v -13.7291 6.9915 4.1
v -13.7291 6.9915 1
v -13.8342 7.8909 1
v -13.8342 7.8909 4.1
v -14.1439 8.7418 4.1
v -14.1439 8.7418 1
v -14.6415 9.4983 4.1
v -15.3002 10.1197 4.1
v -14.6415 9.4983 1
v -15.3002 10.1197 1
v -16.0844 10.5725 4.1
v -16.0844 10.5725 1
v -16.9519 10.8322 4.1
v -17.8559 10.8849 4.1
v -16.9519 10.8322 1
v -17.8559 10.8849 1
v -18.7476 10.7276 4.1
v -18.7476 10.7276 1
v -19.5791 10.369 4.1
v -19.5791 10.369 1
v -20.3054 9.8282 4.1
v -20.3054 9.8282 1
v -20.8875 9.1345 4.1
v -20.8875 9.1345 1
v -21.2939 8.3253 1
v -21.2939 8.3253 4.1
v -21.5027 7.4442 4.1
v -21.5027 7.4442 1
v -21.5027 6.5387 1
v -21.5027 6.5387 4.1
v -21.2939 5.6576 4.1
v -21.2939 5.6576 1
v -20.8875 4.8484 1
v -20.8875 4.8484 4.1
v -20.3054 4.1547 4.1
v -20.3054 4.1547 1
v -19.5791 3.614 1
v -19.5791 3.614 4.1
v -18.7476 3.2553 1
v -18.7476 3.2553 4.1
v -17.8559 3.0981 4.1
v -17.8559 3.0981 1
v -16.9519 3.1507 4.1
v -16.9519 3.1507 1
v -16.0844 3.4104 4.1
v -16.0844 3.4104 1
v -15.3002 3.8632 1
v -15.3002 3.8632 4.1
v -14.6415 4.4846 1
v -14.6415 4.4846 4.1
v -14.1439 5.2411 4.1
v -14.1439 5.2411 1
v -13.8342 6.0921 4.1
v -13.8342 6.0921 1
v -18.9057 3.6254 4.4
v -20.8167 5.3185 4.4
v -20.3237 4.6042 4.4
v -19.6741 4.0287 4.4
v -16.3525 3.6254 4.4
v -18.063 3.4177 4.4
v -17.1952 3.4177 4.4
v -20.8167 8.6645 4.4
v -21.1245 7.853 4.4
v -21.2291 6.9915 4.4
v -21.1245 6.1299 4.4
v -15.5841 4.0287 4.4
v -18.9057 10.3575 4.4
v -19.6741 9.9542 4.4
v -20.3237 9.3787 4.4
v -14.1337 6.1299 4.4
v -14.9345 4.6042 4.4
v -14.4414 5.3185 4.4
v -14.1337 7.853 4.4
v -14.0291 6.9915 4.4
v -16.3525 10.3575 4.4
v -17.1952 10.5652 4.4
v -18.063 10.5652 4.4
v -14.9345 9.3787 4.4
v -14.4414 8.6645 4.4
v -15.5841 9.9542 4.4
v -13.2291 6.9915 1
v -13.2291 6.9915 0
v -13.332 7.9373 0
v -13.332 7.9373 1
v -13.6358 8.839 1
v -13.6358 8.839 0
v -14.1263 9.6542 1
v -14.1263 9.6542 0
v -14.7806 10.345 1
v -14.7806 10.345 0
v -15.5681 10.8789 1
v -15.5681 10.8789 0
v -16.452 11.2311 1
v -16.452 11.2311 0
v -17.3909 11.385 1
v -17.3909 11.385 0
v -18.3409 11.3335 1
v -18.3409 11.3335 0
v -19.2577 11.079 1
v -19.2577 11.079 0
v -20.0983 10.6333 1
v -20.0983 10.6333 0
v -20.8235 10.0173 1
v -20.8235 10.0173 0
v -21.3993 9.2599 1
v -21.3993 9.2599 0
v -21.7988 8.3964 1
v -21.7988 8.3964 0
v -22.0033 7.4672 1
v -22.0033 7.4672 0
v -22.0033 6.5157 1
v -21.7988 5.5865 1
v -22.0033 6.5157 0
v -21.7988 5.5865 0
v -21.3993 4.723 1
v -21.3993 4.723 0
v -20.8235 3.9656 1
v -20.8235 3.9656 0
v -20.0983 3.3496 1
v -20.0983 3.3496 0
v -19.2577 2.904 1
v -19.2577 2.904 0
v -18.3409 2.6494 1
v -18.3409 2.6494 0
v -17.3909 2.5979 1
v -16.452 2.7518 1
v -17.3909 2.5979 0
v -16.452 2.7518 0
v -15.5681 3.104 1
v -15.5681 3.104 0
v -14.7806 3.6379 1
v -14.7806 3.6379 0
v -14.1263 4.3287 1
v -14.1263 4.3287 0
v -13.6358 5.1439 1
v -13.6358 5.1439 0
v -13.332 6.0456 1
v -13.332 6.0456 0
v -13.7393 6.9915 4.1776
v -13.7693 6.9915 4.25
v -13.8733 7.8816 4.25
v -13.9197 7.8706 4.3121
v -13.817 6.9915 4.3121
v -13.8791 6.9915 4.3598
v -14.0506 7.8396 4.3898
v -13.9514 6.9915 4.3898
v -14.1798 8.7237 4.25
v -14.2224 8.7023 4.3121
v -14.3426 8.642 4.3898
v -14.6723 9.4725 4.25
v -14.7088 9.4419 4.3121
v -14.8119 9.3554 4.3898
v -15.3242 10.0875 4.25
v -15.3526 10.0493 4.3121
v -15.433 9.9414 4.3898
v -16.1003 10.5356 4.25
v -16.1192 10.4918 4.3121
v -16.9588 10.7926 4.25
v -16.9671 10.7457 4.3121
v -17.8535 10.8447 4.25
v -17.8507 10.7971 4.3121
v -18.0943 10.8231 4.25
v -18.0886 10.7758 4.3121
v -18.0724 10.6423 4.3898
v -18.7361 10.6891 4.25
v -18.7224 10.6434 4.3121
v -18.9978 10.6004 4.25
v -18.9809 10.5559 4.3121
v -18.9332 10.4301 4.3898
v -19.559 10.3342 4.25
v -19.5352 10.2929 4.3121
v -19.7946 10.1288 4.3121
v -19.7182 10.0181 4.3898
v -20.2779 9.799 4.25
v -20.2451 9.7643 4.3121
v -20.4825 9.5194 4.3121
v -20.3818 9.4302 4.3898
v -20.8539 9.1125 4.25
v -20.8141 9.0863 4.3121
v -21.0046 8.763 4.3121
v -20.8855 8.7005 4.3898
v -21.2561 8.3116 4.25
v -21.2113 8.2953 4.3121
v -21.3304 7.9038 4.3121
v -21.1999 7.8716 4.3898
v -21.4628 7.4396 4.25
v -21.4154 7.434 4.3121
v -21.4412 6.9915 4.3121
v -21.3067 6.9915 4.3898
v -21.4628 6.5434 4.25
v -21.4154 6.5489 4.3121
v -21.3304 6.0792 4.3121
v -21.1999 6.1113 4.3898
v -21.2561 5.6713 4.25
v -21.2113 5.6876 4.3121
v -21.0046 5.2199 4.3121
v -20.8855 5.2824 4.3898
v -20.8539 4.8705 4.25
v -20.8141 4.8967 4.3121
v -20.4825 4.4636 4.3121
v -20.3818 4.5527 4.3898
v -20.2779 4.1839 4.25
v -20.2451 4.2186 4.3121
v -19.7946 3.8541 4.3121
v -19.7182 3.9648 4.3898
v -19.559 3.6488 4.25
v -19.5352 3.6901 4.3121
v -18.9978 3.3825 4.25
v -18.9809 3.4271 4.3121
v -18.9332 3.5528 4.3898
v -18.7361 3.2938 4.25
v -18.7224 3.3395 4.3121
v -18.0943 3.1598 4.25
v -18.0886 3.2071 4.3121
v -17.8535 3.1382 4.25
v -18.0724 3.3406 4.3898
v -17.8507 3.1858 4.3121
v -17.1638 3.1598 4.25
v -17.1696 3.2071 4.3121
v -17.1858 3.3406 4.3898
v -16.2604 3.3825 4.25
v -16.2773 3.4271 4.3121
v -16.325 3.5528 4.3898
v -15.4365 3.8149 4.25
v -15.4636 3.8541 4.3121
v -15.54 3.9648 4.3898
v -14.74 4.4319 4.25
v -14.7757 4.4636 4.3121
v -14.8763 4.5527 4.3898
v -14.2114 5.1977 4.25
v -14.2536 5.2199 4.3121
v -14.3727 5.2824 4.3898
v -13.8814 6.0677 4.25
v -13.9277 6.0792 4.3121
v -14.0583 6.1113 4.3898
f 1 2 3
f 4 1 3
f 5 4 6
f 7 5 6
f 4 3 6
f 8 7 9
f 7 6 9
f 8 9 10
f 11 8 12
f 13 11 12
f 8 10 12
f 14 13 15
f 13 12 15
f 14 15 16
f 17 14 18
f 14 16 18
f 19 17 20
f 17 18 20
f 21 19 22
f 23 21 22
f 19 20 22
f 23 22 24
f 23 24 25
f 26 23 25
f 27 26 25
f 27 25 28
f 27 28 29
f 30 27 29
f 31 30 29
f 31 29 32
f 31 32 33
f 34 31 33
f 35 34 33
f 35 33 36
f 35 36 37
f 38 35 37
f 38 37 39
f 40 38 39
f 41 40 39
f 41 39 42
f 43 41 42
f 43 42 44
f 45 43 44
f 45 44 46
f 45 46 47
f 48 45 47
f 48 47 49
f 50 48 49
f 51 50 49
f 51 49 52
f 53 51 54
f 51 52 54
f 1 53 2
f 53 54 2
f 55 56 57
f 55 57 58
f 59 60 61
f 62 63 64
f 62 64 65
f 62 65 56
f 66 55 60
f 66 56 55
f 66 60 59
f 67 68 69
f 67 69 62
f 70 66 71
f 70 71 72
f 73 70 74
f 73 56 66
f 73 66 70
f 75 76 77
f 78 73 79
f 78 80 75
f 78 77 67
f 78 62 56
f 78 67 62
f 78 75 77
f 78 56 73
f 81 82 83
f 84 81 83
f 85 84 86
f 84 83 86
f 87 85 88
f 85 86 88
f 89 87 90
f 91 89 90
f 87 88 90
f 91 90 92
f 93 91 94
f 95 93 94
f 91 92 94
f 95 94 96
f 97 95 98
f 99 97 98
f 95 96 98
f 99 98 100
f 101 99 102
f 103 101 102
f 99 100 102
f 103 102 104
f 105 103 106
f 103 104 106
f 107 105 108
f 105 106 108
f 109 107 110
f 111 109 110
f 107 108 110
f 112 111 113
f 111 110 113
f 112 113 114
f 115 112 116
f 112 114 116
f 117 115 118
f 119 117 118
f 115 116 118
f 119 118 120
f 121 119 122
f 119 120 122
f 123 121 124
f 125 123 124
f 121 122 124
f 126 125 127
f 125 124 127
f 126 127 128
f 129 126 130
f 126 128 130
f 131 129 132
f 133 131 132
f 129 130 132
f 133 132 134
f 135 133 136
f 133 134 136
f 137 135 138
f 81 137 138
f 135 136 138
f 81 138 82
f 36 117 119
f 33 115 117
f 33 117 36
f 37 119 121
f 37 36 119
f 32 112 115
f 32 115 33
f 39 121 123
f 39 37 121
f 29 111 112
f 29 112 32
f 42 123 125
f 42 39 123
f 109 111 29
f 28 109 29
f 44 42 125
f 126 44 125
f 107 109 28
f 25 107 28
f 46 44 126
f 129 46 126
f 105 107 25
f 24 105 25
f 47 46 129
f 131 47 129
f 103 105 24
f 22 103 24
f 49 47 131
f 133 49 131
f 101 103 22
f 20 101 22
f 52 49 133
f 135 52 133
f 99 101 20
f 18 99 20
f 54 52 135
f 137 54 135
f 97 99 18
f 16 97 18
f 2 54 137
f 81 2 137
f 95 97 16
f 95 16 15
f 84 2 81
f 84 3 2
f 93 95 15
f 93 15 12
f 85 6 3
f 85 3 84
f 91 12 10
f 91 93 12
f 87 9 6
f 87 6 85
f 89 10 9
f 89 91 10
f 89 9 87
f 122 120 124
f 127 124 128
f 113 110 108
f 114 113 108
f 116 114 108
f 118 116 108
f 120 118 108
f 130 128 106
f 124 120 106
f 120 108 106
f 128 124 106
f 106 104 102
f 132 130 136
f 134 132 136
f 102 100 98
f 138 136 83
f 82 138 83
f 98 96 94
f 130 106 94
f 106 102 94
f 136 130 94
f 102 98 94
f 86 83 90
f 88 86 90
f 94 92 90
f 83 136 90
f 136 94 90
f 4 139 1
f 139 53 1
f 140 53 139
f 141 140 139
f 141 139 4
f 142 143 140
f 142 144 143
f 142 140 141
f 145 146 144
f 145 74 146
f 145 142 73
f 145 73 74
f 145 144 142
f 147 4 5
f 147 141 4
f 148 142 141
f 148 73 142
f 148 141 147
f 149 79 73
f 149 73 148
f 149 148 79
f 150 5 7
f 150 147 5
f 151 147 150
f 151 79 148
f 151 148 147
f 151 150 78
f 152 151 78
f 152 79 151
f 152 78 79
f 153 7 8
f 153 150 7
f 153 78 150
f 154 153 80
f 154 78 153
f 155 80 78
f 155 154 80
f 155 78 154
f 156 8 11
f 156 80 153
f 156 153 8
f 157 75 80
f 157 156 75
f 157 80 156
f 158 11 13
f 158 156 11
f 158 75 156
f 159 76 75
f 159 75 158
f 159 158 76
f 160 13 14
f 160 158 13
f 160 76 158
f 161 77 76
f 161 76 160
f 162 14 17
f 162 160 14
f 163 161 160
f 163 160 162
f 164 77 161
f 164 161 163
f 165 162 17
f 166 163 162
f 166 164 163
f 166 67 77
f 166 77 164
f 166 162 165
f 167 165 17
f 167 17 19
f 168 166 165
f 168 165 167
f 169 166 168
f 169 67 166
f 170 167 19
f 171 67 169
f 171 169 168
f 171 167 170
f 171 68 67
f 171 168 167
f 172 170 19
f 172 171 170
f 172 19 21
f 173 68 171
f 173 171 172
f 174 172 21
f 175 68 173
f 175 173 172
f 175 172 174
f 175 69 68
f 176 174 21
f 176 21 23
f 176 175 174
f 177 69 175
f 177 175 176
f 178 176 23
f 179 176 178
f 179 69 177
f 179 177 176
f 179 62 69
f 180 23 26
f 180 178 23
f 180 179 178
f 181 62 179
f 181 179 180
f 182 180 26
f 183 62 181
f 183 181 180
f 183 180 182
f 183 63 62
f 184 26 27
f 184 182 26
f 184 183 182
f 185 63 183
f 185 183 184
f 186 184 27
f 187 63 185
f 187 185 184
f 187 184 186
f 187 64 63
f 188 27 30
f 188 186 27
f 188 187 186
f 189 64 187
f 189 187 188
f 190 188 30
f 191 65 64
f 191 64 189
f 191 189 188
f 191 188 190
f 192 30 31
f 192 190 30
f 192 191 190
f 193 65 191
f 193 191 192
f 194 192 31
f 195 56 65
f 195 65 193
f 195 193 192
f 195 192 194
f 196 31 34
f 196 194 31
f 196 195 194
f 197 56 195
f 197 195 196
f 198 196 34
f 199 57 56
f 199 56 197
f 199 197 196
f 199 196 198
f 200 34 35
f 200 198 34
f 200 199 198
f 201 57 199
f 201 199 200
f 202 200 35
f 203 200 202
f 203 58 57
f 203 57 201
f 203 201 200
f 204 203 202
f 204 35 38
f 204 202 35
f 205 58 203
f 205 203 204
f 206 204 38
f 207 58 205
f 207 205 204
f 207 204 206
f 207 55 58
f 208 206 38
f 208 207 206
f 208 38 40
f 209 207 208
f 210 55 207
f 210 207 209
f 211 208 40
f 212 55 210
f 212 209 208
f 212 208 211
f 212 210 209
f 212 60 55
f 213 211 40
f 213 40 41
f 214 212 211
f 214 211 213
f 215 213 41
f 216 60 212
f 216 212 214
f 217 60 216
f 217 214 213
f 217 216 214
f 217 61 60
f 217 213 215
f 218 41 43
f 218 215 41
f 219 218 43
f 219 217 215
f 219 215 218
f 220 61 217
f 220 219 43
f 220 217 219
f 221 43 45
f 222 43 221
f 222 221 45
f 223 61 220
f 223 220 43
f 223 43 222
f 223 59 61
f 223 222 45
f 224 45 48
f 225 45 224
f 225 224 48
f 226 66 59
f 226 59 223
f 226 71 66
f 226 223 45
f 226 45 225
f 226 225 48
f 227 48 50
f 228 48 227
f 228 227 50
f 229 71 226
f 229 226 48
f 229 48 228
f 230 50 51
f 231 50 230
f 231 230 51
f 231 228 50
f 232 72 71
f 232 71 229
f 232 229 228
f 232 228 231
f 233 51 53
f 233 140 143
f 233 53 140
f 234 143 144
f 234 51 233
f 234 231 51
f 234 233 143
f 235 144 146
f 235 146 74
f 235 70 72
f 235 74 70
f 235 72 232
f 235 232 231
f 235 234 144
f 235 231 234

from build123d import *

# Parameters (mm, degrees)
F0_R     = 4.4
F0_R_2   = 3.9
F1_DEPTH = 1
F2_DEPTH = 4.4
F3_R     = 0.3


# Not quite as in the source:
# - a feature names something its author has since deleted; it is built from what else it names


with BuildPart() as f1:
    # F0 (on Top) → F1 (new body)
    with BuildSketch(Plane.XY):
        with Locations((-17.6290911883, 6.9914618582)):
            Circle(F0_R)
        with Locations((-17.6290911883, 6.9914618582)):
            Circle(F0_R_2, mode=Mode.SUBTRACT)
        with Locations((-17.6290911883, 6.9914618582)):
            Circle(F0_R_2)
    extrude(amount=F1_DEPTH)

    # F0 (on Top) → F2 (join)
    with BuildSketch(Plane.XY):
        with Locations((-17.6290911883, 6.9914618582)):
            Circle(F0_R_2)
    extrude(amount=F2_DEPTH)

    # F3
    f3_edges = [f1.edges().sort_by_distance(p)[0] for p in [
        (-21.529091, 6.991462, 4.4),
    ]]
    fillet(f3_edges, radius=F3_R)


solid = f1.part
